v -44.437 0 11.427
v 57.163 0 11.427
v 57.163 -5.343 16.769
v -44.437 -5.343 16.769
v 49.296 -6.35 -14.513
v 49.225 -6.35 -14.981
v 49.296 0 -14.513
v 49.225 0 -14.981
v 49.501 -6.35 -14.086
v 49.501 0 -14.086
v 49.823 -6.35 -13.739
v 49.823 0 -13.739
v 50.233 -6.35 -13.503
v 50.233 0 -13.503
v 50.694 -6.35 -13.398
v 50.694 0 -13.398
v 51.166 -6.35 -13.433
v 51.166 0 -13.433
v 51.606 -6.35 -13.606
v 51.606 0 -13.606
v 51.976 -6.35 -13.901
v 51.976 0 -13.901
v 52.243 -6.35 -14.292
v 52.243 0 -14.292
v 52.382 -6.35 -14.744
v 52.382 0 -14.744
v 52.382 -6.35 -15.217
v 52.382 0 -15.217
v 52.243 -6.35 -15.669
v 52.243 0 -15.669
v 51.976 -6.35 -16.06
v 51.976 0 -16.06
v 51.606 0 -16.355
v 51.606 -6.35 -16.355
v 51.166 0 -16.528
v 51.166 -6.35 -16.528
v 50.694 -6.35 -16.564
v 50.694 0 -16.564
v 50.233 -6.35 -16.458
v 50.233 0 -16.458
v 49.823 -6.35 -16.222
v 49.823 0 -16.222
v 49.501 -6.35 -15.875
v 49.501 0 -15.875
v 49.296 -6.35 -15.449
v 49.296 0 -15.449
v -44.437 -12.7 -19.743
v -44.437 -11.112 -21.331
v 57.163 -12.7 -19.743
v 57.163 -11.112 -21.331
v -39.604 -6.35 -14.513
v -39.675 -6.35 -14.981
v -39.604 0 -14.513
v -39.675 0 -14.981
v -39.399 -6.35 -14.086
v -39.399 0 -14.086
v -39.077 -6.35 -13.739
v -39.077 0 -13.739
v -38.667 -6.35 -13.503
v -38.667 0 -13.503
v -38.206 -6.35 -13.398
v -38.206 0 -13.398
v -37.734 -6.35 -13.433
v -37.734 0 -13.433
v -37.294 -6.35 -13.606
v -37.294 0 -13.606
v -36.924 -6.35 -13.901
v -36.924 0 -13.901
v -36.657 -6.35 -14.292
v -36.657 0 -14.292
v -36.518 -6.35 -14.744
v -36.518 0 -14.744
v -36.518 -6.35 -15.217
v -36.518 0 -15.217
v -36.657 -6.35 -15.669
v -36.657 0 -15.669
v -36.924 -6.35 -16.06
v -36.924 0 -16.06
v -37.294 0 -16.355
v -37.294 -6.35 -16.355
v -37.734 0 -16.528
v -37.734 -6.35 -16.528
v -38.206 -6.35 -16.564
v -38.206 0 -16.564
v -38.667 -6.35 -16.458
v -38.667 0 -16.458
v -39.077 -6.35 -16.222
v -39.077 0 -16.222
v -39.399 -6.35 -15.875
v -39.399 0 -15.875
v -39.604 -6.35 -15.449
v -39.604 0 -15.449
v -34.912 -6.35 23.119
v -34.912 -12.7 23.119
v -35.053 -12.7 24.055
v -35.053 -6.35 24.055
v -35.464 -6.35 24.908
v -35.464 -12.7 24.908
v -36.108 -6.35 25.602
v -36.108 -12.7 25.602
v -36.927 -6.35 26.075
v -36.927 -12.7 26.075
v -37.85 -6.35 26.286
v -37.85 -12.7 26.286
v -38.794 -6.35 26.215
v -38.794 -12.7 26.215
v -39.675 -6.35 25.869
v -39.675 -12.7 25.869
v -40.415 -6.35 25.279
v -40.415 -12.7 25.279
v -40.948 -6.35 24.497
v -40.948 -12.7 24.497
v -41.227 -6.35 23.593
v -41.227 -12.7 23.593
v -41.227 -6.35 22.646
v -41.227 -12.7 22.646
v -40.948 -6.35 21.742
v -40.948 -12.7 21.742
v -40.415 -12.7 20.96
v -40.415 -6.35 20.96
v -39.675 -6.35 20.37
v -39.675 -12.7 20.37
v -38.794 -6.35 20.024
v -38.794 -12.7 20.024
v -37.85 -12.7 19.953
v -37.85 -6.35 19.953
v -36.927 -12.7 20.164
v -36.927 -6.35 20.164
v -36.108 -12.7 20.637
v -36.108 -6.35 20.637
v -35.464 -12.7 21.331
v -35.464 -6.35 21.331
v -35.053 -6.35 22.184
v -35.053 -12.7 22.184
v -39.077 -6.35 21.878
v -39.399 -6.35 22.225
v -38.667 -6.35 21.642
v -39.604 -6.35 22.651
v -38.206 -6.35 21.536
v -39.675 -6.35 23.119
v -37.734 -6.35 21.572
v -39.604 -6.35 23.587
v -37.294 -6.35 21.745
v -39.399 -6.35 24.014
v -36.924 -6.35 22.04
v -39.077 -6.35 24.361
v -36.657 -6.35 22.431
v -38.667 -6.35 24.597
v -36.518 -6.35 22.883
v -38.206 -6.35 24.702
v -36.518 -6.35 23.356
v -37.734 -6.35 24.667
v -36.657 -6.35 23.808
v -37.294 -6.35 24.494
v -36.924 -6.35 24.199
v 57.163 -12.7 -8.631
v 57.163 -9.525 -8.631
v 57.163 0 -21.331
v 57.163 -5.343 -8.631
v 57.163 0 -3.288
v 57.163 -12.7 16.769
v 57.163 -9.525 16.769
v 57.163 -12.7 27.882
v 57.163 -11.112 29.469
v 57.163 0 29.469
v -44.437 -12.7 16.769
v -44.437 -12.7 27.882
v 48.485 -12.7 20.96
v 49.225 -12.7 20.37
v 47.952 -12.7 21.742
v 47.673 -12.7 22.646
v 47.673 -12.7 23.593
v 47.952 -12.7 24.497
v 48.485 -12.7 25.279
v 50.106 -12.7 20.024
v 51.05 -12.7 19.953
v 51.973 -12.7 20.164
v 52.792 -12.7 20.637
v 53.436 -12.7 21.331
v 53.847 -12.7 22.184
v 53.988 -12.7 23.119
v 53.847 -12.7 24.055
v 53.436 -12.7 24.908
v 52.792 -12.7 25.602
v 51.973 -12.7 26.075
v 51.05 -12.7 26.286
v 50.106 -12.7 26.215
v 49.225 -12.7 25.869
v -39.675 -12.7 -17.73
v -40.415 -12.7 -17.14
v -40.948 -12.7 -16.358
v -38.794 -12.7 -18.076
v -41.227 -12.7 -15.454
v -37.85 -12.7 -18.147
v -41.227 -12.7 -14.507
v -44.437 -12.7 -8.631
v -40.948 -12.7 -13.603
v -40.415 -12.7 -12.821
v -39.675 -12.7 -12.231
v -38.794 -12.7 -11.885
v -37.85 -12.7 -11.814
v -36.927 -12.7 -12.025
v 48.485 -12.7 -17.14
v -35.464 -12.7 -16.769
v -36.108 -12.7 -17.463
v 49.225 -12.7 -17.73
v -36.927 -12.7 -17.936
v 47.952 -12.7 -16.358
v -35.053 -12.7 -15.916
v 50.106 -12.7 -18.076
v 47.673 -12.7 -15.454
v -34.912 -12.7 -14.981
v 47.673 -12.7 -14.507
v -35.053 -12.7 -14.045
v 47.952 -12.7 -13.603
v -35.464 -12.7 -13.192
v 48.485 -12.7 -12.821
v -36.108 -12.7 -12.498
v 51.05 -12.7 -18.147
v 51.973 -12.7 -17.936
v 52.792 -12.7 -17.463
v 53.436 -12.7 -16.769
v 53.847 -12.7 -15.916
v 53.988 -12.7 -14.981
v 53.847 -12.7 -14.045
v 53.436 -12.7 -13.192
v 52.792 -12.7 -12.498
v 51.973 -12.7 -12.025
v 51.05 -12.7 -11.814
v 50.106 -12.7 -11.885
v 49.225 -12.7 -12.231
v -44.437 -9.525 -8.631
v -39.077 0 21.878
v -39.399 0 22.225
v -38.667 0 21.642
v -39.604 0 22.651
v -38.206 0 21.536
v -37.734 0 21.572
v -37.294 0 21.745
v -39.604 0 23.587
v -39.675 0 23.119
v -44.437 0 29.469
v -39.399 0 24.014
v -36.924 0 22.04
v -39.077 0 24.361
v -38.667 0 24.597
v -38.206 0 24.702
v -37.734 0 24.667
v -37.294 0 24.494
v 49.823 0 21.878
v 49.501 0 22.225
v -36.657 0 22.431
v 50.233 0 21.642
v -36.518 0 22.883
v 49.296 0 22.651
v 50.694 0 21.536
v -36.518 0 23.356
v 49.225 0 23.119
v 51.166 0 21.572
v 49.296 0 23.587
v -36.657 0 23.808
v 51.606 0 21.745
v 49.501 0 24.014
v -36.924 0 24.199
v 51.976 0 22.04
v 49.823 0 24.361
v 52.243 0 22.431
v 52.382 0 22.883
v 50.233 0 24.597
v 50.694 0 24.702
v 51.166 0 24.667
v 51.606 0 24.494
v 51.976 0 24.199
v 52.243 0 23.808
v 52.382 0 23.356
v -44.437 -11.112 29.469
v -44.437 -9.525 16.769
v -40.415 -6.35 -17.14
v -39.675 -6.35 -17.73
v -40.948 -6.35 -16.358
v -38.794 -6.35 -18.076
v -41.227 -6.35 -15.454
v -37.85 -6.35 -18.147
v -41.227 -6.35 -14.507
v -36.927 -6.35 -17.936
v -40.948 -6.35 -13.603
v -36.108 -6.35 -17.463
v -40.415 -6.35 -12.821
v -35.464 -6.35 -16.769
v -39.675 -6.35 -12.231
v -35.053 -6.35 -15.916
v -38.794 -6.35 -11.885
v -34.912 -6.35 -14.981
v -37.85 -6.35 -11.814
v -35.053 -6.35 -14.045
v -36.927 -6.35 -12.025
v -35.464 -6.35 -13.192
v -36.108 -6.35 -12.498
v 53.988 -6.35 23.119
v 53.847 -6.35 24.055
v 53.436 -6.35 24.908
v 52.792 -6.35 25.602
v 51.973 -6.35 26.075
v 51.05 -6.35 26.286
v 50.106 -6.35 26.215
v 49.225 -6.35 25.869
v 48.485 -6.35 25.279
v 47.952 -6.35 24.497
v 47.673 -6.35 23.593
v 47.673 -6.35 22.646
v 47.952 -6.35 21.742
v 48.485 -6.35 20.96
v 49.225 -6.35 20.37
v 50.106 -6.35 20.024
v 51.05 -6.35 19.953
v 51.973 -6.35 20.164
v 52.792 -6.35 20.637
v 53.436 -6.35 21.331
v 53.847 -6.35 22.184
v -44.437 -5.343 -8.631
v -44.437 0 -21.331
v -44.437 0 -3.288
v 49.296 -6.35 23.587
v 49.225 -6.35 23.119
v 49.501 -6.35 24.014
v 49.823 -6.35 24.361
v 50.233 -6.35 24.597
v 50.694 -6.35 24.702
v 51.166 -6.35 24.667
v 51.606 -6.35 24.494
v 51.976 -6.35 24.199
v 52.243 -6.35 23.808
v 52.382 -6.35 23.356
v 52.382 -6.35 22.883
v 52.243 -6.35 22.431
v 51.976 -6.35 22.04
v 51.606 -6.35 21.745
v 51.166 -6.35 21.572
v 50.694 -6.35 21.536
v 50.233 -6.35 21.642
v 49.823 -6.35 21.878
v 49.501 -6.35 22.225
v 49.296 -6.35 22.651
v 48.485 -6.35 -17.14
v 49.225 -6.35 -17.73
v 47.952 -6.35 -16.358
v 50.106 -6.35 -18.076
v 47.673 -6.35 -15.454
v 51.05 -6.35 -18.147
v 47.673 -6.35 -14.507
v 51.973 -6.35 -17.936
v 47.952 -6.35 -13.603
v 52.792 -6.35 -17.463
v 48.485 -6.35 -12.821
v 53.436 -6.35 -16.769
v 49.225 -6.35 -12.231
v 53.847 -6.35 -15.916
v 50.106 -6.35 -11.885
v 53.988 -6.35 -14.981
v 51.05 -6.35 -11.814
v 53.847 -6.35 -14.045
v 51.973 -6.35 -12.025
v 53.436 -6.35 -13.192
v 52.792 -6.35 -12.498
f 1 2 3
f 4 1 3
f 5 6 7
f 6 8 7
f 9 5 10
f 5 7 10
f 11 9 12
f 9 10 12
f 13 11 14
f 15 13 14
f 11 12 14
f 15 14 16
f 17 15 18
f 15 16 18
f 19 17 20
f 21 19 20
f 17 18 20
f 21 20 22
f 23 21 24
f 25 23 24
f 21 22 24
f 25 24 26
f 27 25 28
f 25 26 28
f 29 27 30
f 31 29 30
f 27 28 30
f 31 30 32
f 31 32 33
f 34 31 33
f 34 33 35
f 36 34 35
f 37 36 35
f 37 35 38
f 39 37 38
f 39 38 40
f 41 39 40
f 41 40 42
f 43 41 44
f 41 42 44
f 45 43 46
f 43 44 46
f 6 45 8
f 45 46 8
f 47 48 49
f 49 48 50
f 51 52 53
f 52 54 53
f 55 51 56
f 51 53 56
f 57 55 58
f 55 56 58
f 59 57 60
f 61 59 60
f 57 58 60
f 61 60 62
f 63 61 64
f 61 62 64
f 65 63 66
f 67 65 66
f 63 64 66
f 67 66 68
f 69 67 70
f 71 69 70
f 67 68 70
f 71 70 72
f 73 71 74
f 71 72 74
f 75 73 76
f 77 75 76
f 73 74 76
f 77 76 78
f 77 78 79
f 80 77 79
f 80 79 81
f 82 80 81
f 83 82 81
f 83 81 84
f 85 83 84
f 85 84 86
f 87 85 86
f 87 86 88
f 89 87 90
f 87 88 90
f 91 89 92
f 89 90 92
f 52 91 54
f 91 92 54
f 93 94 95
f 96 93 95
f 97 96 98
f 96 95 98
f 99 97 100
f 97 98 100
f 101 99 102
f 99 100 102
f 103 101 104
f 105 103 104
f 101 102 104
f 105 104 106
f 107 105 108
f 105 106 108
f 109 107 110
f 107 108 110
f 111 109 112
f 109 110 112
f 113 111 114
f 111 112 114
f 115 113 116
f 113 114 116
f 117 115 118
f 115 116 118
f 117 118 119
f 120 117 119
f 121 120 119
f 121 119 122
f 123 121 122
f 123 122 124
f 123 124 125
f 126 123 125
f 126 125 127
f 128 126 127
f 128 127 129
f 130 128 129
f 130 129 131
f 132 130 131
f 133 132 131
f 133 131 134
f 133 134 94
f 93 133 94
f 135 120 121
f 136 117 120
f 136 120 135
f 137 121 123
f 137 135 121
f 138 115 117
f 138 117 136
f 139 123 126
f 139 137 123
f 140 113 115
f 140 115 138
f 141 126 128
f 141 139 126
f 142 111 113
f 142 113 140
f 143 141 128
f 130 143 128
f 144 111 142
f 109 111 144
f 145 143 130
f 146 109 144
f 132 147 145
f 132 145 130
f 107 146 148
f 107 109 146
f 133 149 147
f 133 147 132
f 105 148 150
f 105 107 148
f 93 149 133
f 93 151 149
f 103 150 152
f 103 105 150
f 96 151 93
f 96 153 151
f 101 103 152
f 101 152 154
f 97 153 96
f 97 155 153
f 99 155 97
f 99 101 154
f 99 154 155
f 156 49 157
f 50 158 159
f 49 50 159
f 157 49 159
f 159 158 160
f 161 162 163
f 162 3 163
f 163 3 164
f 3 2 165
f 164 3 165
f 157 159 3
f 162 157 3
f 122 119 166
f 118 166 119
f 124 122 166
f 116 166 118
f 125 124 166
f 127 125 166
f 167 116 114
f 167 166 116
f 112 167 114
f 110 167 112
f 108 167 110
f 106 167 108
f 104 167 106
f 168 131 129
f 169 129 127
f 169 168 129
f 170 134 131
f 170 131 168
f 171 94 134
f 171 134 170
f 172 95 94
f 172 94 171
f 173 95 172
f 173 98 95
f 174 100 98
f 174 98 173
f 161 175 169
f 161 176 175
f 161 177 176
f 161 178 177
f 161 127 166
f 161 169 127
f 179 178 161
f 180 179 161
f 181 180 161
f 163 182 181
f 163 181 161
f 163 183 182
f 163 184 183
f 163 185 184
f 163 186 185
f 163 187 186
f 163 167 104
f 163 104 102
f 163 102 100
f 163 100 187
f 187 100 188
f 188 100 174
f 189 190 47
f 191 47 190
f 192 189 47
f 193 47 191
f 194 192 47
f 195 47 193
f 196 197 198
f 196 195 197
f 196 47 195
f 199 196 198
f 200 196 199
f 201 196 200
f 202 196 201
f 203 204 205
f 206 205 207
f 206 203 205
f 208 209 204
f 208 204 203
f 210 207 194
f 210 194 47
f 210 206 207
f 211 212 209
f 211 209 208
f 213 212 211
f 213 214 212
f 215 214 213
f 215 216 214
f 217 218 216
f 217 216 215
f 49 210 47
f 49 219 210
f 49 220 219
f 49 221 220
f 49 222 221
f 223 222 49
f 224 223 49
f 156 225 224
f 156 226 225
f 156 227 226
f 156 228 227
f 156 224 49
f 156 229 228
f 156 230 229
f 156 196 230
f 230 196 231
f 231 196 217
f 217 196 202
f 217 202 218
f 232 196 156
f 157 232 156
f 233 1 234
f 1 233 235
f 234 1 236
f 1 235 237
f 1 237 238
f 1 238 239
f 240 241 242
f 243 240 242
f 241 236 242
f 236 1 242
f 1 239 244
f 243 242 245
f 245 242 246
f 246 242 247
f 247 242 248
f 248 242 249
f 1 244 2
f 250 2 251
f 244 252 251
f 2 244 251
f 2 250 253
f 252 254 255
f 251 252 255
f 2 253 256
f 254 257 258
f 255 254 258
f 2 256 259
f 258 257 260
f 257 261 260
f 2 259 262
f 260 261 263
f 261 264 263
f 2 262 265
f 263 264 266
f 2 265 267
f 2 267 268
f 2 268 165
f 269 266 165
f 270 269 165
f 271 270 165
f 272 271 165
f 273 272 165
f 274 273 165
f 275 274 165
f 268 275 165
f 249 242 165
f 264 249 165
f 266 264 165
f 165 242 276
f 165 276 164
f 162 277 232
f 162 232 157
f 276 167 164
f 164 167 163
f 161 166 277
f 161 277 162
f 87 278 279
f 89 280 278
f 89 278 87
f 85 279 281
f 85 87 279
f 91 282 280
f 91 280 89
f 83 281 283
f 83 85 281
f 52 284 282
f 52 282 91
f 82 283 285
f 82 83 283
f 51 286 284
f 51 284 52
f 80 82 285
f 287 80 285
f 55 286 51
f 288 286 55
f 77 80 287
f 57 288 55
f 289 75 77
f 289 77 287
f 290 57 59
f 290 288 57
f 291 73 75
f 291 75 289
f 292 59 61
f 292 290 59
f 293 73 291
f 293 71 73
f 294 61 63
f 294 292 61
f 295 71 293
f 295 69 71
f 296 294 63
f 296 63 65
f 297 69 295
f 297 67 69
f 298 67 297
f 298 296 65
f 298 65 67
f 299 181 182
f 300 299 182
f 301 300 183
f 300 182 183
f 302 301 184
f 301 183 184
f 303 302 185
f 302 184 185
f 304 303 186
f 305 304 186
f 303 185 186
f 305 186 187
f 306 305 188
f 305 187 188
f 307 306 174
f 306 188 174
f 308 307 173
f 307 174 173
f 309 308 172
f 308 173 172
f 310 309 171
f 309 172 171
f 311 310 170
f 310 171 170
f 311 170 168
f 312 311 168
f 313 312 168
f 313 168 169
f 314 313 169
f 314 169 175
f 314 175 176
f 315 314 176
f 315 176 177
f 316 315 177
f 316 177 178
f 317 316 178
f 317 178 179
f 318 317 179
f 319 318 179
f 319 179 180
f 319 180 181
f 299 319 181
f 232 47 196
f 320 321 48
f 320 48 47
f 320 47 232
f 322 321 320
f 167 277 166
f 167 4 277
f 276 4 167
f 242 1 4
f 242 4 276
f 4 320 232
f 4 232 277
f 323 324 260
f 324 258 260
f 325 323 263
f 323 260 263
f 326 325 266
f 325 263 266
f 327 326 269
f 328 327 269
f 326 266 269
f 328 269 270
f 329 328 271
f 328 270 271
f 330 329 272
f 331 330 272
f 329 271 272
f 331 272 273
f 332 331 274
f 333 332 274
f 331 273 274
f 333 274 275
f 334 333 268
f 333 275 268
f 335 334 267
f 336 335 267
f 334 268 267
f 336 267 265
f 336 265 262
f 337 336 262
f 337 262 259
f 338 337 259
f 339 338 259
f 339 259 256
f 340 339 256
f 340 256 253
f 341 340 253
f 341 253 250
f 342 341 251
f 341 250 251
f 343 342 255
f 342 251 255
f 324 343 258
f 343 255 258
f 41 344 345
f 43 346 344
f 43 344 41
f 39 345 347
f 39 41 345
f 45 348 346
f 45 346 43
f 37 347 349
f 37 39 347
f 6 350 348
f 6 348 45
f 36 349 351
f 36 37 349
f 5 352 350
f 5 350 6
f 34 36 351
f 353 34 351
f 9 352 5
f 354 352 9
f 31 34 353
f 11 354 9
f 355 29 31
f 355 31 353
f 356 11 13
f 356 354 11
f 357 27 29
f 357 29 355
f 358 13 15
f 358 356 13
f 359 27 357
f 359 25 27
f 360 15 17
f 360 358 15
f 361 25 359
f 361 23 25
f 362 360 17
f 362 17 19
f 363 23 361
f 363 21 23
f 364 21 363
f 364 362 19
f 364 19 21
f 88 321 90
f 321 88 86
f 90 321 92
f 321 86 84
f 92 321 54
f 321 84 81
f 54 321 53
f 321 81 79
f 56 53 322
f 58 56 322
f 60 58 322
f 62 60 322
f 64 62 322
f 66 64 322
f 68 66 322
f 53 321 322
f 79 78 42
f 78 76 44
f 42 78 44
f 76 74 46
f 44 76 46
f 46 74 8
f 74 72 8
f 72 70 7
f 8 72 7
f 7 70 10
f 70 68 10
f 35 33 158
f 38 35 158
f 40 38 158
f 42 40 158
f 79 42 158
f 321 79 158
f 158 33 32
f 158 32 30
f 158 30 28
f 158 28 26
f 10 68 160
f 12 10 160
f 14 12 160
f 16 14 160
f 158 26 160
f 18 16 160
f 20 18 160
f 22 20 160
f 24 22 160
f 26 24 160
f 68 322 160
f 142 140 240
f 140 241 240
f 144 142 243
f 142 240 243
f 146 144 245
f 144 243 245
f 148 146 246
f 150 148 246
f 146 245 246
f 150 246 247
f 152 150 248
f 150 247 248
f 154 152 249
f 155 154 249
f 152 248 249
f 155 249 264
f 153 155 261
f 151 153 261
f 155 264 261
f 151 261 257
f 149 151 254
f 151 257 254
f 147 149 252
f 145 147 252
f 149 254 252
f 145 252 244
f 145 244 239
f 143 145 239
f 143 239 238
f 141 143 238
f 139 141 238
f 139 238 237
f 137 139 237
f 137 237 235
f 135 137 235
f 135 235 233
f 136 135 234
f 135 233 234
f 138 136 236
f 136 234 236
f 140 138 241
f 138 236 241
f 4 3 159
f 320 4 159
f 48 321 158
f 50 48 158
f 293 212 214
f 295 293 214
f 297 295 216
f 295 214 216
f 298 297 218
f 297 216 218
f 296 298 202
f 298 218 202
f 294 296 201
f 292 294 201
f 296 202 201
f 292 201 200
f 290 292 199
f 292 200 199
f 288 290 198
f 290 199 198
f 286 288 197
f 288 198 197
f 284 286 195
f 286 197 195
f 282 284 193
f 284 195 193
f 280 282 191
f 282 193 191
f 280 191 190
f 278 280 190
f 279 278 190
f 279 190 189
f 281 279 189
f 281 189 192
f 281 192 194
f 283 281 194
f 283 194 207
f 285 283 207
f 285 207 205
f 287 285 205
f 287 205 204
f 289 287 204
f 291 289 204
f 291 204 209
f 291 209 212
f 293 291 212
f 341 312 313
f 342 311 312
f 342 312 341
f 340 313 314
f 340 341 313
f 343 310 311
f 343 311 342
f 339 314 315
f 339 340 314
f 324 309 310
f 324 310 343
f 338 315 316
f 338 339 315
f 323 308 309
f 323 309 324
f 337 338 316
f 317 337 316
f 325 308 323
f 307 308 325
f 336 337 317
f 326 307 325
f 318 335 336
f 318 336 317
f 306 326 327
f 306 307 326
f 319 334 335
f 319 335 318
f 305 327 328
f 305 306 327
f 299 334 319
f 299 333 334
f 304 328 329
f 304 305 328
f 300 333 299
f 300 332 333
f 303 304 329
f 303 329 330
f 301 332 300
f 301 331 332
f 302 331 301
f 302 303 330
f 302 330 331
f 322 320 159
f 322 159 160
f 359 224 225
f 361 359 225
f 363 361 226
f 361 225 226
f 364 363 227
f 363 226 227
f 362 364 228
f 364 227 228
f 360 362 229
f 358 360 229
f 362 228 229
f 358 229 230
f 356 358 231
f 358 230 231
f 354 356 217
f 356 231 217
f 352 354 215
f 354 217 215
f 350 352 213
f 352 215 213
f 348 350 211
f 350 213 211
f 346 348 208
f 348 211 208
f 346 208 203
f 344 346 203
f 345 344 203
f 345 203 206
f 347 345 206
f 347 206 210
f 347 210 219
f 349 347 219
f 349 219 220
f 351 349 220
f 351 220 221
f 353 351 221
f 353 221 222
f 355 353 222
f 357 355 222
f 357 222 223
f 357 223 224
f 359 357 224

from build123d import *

# Parameters (mm, degrees)
F0_W           = 101.6
F0_H           = 50.8
F1_DEPTH       = 12.7
F3_D           = 3.175
F3_CBORE_D     = 6.35
F3_CBORE_DEPTH = 6.35
F4_W           = 101.6
F4_H           = 25.4
F5_DEPTH       = 3.175
F6_SIZE        = 1.5875
F8_DEPTH       = 101.601


with BuildPart() as f1:
    # F0 (on Front) → F1 (new body)
    with BuildSketch(Plane.XZ):
        with Locations((6.362615, 4.069407)):
            Rectangle(F0_W, F0_H)
    extrude(amount=F1_DEPTH)

    # F3 (through all)
    with Locations(Plane.XZ.offset(12.7)):
        with Locations((-38.087385, -14.980593), (50.812615, -14.980593), (50.812615, 23.119407), (-38.087385, 23.119407)):
            CounterBoreHole(F3_D / 2, F3_CBORE_D / 2, F3_CBORE_DEPTH)

    # F4 (on face) → F5 (cut)
    with BuildSketch(Plane.XZ.offset(12.7)):
        with Locations((6.362615, 4.069407)):
            Rectangle(F4_W, F4_H)
    extrude(amount=-F5_DEPTH, mode=Mode.SUBTRACT)

    # F6
    f6_edges = [f1.edges().sort_by_distance(p)[0] for p in [
        (6.362615, -12.7, 29.469407),
        (6.362615, -12.7, -21.330593),
    ]]
    chamfer(f6_edges, length=F6_SIZE)

    # F7 (on face) → F8 (cut, through all)
    with BuildSketch(Plane.YZ.offset(57.162615)):
        Polygon((-5.34251, 16.769407), (-5.34251, -8.630593), (0, -3.288082), (0, 11.426897), align=None)
    extrude(amount=-F8_DEPTH, mode=Mode.SUBTRACT)


solid = f1.part
